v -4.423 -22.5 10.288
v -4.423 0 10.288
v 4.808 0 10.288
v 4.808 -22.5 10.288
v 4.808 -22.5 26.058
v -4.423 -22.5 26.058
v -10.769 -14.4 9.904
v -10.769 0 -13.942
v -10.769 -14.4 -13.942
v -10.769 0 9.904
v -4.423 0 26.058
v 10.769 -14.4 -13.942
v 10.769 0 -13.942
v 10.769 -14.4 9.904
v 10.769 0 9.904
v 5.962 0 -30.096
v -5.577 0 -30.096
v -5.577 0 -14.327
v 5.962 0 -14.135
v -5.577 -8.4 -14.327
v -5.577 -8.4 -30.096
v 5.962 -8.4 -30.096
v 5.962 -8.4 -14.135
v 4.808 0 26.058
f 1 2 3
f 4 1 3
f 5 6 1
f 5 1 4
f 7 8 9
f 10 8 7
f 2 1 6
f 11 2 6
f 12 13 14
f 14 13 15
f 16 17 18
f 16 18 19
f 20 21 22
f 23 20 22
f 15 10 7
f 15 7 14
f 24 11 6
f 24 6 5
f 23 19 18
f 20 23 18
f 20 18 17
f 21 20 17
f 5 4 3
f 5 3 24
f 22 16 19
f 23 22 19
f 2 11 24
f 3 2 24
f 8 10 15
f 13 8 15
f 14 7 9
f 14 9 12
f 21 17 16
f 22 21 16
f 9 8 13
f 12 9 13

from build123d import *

# Parameters (mm, degrees)
F0_W     = 21.538461
F0_H     = 23.846156
F1_DEPTH = 14.4
F3_DEPTH = 8.4
F4_W     = 9.23077
F4_H     = 15.769232
F5_DEPTH = 22.5


with BuildPart() as f1:
    # F0 (on Front) → F1 (new body)
    with BuildSketch(Plane.XZ):
        with Locations((0, -2.019231)):
            Rectangle(F0_W, F0_H)
    extrude(amount=F1_DEPTH)


with BuildPart() as f3:
    # F2 (on Front) → F3 (new body)
    with BuildSketch(Plane.XZ):
        Polygon((5.961541, -14.134617), (-5.576923, -14.326924), (-5.576923, -30.096157), (5.961541, -30.096157), align=None)
    extrude(amount=F3_DEPTH)


with BuildPart() as f5:
    # F4 (on Front) → F5 (new body)
    with BuildSketch(Plane.XZ):
        with Locations((0.192307, 18.173078)):
            Rectangle(F4_W, F4_H)
    extrude(amount=F5_DEPTH)


solid = Compound([f1.part, f3.part, f5.part])
